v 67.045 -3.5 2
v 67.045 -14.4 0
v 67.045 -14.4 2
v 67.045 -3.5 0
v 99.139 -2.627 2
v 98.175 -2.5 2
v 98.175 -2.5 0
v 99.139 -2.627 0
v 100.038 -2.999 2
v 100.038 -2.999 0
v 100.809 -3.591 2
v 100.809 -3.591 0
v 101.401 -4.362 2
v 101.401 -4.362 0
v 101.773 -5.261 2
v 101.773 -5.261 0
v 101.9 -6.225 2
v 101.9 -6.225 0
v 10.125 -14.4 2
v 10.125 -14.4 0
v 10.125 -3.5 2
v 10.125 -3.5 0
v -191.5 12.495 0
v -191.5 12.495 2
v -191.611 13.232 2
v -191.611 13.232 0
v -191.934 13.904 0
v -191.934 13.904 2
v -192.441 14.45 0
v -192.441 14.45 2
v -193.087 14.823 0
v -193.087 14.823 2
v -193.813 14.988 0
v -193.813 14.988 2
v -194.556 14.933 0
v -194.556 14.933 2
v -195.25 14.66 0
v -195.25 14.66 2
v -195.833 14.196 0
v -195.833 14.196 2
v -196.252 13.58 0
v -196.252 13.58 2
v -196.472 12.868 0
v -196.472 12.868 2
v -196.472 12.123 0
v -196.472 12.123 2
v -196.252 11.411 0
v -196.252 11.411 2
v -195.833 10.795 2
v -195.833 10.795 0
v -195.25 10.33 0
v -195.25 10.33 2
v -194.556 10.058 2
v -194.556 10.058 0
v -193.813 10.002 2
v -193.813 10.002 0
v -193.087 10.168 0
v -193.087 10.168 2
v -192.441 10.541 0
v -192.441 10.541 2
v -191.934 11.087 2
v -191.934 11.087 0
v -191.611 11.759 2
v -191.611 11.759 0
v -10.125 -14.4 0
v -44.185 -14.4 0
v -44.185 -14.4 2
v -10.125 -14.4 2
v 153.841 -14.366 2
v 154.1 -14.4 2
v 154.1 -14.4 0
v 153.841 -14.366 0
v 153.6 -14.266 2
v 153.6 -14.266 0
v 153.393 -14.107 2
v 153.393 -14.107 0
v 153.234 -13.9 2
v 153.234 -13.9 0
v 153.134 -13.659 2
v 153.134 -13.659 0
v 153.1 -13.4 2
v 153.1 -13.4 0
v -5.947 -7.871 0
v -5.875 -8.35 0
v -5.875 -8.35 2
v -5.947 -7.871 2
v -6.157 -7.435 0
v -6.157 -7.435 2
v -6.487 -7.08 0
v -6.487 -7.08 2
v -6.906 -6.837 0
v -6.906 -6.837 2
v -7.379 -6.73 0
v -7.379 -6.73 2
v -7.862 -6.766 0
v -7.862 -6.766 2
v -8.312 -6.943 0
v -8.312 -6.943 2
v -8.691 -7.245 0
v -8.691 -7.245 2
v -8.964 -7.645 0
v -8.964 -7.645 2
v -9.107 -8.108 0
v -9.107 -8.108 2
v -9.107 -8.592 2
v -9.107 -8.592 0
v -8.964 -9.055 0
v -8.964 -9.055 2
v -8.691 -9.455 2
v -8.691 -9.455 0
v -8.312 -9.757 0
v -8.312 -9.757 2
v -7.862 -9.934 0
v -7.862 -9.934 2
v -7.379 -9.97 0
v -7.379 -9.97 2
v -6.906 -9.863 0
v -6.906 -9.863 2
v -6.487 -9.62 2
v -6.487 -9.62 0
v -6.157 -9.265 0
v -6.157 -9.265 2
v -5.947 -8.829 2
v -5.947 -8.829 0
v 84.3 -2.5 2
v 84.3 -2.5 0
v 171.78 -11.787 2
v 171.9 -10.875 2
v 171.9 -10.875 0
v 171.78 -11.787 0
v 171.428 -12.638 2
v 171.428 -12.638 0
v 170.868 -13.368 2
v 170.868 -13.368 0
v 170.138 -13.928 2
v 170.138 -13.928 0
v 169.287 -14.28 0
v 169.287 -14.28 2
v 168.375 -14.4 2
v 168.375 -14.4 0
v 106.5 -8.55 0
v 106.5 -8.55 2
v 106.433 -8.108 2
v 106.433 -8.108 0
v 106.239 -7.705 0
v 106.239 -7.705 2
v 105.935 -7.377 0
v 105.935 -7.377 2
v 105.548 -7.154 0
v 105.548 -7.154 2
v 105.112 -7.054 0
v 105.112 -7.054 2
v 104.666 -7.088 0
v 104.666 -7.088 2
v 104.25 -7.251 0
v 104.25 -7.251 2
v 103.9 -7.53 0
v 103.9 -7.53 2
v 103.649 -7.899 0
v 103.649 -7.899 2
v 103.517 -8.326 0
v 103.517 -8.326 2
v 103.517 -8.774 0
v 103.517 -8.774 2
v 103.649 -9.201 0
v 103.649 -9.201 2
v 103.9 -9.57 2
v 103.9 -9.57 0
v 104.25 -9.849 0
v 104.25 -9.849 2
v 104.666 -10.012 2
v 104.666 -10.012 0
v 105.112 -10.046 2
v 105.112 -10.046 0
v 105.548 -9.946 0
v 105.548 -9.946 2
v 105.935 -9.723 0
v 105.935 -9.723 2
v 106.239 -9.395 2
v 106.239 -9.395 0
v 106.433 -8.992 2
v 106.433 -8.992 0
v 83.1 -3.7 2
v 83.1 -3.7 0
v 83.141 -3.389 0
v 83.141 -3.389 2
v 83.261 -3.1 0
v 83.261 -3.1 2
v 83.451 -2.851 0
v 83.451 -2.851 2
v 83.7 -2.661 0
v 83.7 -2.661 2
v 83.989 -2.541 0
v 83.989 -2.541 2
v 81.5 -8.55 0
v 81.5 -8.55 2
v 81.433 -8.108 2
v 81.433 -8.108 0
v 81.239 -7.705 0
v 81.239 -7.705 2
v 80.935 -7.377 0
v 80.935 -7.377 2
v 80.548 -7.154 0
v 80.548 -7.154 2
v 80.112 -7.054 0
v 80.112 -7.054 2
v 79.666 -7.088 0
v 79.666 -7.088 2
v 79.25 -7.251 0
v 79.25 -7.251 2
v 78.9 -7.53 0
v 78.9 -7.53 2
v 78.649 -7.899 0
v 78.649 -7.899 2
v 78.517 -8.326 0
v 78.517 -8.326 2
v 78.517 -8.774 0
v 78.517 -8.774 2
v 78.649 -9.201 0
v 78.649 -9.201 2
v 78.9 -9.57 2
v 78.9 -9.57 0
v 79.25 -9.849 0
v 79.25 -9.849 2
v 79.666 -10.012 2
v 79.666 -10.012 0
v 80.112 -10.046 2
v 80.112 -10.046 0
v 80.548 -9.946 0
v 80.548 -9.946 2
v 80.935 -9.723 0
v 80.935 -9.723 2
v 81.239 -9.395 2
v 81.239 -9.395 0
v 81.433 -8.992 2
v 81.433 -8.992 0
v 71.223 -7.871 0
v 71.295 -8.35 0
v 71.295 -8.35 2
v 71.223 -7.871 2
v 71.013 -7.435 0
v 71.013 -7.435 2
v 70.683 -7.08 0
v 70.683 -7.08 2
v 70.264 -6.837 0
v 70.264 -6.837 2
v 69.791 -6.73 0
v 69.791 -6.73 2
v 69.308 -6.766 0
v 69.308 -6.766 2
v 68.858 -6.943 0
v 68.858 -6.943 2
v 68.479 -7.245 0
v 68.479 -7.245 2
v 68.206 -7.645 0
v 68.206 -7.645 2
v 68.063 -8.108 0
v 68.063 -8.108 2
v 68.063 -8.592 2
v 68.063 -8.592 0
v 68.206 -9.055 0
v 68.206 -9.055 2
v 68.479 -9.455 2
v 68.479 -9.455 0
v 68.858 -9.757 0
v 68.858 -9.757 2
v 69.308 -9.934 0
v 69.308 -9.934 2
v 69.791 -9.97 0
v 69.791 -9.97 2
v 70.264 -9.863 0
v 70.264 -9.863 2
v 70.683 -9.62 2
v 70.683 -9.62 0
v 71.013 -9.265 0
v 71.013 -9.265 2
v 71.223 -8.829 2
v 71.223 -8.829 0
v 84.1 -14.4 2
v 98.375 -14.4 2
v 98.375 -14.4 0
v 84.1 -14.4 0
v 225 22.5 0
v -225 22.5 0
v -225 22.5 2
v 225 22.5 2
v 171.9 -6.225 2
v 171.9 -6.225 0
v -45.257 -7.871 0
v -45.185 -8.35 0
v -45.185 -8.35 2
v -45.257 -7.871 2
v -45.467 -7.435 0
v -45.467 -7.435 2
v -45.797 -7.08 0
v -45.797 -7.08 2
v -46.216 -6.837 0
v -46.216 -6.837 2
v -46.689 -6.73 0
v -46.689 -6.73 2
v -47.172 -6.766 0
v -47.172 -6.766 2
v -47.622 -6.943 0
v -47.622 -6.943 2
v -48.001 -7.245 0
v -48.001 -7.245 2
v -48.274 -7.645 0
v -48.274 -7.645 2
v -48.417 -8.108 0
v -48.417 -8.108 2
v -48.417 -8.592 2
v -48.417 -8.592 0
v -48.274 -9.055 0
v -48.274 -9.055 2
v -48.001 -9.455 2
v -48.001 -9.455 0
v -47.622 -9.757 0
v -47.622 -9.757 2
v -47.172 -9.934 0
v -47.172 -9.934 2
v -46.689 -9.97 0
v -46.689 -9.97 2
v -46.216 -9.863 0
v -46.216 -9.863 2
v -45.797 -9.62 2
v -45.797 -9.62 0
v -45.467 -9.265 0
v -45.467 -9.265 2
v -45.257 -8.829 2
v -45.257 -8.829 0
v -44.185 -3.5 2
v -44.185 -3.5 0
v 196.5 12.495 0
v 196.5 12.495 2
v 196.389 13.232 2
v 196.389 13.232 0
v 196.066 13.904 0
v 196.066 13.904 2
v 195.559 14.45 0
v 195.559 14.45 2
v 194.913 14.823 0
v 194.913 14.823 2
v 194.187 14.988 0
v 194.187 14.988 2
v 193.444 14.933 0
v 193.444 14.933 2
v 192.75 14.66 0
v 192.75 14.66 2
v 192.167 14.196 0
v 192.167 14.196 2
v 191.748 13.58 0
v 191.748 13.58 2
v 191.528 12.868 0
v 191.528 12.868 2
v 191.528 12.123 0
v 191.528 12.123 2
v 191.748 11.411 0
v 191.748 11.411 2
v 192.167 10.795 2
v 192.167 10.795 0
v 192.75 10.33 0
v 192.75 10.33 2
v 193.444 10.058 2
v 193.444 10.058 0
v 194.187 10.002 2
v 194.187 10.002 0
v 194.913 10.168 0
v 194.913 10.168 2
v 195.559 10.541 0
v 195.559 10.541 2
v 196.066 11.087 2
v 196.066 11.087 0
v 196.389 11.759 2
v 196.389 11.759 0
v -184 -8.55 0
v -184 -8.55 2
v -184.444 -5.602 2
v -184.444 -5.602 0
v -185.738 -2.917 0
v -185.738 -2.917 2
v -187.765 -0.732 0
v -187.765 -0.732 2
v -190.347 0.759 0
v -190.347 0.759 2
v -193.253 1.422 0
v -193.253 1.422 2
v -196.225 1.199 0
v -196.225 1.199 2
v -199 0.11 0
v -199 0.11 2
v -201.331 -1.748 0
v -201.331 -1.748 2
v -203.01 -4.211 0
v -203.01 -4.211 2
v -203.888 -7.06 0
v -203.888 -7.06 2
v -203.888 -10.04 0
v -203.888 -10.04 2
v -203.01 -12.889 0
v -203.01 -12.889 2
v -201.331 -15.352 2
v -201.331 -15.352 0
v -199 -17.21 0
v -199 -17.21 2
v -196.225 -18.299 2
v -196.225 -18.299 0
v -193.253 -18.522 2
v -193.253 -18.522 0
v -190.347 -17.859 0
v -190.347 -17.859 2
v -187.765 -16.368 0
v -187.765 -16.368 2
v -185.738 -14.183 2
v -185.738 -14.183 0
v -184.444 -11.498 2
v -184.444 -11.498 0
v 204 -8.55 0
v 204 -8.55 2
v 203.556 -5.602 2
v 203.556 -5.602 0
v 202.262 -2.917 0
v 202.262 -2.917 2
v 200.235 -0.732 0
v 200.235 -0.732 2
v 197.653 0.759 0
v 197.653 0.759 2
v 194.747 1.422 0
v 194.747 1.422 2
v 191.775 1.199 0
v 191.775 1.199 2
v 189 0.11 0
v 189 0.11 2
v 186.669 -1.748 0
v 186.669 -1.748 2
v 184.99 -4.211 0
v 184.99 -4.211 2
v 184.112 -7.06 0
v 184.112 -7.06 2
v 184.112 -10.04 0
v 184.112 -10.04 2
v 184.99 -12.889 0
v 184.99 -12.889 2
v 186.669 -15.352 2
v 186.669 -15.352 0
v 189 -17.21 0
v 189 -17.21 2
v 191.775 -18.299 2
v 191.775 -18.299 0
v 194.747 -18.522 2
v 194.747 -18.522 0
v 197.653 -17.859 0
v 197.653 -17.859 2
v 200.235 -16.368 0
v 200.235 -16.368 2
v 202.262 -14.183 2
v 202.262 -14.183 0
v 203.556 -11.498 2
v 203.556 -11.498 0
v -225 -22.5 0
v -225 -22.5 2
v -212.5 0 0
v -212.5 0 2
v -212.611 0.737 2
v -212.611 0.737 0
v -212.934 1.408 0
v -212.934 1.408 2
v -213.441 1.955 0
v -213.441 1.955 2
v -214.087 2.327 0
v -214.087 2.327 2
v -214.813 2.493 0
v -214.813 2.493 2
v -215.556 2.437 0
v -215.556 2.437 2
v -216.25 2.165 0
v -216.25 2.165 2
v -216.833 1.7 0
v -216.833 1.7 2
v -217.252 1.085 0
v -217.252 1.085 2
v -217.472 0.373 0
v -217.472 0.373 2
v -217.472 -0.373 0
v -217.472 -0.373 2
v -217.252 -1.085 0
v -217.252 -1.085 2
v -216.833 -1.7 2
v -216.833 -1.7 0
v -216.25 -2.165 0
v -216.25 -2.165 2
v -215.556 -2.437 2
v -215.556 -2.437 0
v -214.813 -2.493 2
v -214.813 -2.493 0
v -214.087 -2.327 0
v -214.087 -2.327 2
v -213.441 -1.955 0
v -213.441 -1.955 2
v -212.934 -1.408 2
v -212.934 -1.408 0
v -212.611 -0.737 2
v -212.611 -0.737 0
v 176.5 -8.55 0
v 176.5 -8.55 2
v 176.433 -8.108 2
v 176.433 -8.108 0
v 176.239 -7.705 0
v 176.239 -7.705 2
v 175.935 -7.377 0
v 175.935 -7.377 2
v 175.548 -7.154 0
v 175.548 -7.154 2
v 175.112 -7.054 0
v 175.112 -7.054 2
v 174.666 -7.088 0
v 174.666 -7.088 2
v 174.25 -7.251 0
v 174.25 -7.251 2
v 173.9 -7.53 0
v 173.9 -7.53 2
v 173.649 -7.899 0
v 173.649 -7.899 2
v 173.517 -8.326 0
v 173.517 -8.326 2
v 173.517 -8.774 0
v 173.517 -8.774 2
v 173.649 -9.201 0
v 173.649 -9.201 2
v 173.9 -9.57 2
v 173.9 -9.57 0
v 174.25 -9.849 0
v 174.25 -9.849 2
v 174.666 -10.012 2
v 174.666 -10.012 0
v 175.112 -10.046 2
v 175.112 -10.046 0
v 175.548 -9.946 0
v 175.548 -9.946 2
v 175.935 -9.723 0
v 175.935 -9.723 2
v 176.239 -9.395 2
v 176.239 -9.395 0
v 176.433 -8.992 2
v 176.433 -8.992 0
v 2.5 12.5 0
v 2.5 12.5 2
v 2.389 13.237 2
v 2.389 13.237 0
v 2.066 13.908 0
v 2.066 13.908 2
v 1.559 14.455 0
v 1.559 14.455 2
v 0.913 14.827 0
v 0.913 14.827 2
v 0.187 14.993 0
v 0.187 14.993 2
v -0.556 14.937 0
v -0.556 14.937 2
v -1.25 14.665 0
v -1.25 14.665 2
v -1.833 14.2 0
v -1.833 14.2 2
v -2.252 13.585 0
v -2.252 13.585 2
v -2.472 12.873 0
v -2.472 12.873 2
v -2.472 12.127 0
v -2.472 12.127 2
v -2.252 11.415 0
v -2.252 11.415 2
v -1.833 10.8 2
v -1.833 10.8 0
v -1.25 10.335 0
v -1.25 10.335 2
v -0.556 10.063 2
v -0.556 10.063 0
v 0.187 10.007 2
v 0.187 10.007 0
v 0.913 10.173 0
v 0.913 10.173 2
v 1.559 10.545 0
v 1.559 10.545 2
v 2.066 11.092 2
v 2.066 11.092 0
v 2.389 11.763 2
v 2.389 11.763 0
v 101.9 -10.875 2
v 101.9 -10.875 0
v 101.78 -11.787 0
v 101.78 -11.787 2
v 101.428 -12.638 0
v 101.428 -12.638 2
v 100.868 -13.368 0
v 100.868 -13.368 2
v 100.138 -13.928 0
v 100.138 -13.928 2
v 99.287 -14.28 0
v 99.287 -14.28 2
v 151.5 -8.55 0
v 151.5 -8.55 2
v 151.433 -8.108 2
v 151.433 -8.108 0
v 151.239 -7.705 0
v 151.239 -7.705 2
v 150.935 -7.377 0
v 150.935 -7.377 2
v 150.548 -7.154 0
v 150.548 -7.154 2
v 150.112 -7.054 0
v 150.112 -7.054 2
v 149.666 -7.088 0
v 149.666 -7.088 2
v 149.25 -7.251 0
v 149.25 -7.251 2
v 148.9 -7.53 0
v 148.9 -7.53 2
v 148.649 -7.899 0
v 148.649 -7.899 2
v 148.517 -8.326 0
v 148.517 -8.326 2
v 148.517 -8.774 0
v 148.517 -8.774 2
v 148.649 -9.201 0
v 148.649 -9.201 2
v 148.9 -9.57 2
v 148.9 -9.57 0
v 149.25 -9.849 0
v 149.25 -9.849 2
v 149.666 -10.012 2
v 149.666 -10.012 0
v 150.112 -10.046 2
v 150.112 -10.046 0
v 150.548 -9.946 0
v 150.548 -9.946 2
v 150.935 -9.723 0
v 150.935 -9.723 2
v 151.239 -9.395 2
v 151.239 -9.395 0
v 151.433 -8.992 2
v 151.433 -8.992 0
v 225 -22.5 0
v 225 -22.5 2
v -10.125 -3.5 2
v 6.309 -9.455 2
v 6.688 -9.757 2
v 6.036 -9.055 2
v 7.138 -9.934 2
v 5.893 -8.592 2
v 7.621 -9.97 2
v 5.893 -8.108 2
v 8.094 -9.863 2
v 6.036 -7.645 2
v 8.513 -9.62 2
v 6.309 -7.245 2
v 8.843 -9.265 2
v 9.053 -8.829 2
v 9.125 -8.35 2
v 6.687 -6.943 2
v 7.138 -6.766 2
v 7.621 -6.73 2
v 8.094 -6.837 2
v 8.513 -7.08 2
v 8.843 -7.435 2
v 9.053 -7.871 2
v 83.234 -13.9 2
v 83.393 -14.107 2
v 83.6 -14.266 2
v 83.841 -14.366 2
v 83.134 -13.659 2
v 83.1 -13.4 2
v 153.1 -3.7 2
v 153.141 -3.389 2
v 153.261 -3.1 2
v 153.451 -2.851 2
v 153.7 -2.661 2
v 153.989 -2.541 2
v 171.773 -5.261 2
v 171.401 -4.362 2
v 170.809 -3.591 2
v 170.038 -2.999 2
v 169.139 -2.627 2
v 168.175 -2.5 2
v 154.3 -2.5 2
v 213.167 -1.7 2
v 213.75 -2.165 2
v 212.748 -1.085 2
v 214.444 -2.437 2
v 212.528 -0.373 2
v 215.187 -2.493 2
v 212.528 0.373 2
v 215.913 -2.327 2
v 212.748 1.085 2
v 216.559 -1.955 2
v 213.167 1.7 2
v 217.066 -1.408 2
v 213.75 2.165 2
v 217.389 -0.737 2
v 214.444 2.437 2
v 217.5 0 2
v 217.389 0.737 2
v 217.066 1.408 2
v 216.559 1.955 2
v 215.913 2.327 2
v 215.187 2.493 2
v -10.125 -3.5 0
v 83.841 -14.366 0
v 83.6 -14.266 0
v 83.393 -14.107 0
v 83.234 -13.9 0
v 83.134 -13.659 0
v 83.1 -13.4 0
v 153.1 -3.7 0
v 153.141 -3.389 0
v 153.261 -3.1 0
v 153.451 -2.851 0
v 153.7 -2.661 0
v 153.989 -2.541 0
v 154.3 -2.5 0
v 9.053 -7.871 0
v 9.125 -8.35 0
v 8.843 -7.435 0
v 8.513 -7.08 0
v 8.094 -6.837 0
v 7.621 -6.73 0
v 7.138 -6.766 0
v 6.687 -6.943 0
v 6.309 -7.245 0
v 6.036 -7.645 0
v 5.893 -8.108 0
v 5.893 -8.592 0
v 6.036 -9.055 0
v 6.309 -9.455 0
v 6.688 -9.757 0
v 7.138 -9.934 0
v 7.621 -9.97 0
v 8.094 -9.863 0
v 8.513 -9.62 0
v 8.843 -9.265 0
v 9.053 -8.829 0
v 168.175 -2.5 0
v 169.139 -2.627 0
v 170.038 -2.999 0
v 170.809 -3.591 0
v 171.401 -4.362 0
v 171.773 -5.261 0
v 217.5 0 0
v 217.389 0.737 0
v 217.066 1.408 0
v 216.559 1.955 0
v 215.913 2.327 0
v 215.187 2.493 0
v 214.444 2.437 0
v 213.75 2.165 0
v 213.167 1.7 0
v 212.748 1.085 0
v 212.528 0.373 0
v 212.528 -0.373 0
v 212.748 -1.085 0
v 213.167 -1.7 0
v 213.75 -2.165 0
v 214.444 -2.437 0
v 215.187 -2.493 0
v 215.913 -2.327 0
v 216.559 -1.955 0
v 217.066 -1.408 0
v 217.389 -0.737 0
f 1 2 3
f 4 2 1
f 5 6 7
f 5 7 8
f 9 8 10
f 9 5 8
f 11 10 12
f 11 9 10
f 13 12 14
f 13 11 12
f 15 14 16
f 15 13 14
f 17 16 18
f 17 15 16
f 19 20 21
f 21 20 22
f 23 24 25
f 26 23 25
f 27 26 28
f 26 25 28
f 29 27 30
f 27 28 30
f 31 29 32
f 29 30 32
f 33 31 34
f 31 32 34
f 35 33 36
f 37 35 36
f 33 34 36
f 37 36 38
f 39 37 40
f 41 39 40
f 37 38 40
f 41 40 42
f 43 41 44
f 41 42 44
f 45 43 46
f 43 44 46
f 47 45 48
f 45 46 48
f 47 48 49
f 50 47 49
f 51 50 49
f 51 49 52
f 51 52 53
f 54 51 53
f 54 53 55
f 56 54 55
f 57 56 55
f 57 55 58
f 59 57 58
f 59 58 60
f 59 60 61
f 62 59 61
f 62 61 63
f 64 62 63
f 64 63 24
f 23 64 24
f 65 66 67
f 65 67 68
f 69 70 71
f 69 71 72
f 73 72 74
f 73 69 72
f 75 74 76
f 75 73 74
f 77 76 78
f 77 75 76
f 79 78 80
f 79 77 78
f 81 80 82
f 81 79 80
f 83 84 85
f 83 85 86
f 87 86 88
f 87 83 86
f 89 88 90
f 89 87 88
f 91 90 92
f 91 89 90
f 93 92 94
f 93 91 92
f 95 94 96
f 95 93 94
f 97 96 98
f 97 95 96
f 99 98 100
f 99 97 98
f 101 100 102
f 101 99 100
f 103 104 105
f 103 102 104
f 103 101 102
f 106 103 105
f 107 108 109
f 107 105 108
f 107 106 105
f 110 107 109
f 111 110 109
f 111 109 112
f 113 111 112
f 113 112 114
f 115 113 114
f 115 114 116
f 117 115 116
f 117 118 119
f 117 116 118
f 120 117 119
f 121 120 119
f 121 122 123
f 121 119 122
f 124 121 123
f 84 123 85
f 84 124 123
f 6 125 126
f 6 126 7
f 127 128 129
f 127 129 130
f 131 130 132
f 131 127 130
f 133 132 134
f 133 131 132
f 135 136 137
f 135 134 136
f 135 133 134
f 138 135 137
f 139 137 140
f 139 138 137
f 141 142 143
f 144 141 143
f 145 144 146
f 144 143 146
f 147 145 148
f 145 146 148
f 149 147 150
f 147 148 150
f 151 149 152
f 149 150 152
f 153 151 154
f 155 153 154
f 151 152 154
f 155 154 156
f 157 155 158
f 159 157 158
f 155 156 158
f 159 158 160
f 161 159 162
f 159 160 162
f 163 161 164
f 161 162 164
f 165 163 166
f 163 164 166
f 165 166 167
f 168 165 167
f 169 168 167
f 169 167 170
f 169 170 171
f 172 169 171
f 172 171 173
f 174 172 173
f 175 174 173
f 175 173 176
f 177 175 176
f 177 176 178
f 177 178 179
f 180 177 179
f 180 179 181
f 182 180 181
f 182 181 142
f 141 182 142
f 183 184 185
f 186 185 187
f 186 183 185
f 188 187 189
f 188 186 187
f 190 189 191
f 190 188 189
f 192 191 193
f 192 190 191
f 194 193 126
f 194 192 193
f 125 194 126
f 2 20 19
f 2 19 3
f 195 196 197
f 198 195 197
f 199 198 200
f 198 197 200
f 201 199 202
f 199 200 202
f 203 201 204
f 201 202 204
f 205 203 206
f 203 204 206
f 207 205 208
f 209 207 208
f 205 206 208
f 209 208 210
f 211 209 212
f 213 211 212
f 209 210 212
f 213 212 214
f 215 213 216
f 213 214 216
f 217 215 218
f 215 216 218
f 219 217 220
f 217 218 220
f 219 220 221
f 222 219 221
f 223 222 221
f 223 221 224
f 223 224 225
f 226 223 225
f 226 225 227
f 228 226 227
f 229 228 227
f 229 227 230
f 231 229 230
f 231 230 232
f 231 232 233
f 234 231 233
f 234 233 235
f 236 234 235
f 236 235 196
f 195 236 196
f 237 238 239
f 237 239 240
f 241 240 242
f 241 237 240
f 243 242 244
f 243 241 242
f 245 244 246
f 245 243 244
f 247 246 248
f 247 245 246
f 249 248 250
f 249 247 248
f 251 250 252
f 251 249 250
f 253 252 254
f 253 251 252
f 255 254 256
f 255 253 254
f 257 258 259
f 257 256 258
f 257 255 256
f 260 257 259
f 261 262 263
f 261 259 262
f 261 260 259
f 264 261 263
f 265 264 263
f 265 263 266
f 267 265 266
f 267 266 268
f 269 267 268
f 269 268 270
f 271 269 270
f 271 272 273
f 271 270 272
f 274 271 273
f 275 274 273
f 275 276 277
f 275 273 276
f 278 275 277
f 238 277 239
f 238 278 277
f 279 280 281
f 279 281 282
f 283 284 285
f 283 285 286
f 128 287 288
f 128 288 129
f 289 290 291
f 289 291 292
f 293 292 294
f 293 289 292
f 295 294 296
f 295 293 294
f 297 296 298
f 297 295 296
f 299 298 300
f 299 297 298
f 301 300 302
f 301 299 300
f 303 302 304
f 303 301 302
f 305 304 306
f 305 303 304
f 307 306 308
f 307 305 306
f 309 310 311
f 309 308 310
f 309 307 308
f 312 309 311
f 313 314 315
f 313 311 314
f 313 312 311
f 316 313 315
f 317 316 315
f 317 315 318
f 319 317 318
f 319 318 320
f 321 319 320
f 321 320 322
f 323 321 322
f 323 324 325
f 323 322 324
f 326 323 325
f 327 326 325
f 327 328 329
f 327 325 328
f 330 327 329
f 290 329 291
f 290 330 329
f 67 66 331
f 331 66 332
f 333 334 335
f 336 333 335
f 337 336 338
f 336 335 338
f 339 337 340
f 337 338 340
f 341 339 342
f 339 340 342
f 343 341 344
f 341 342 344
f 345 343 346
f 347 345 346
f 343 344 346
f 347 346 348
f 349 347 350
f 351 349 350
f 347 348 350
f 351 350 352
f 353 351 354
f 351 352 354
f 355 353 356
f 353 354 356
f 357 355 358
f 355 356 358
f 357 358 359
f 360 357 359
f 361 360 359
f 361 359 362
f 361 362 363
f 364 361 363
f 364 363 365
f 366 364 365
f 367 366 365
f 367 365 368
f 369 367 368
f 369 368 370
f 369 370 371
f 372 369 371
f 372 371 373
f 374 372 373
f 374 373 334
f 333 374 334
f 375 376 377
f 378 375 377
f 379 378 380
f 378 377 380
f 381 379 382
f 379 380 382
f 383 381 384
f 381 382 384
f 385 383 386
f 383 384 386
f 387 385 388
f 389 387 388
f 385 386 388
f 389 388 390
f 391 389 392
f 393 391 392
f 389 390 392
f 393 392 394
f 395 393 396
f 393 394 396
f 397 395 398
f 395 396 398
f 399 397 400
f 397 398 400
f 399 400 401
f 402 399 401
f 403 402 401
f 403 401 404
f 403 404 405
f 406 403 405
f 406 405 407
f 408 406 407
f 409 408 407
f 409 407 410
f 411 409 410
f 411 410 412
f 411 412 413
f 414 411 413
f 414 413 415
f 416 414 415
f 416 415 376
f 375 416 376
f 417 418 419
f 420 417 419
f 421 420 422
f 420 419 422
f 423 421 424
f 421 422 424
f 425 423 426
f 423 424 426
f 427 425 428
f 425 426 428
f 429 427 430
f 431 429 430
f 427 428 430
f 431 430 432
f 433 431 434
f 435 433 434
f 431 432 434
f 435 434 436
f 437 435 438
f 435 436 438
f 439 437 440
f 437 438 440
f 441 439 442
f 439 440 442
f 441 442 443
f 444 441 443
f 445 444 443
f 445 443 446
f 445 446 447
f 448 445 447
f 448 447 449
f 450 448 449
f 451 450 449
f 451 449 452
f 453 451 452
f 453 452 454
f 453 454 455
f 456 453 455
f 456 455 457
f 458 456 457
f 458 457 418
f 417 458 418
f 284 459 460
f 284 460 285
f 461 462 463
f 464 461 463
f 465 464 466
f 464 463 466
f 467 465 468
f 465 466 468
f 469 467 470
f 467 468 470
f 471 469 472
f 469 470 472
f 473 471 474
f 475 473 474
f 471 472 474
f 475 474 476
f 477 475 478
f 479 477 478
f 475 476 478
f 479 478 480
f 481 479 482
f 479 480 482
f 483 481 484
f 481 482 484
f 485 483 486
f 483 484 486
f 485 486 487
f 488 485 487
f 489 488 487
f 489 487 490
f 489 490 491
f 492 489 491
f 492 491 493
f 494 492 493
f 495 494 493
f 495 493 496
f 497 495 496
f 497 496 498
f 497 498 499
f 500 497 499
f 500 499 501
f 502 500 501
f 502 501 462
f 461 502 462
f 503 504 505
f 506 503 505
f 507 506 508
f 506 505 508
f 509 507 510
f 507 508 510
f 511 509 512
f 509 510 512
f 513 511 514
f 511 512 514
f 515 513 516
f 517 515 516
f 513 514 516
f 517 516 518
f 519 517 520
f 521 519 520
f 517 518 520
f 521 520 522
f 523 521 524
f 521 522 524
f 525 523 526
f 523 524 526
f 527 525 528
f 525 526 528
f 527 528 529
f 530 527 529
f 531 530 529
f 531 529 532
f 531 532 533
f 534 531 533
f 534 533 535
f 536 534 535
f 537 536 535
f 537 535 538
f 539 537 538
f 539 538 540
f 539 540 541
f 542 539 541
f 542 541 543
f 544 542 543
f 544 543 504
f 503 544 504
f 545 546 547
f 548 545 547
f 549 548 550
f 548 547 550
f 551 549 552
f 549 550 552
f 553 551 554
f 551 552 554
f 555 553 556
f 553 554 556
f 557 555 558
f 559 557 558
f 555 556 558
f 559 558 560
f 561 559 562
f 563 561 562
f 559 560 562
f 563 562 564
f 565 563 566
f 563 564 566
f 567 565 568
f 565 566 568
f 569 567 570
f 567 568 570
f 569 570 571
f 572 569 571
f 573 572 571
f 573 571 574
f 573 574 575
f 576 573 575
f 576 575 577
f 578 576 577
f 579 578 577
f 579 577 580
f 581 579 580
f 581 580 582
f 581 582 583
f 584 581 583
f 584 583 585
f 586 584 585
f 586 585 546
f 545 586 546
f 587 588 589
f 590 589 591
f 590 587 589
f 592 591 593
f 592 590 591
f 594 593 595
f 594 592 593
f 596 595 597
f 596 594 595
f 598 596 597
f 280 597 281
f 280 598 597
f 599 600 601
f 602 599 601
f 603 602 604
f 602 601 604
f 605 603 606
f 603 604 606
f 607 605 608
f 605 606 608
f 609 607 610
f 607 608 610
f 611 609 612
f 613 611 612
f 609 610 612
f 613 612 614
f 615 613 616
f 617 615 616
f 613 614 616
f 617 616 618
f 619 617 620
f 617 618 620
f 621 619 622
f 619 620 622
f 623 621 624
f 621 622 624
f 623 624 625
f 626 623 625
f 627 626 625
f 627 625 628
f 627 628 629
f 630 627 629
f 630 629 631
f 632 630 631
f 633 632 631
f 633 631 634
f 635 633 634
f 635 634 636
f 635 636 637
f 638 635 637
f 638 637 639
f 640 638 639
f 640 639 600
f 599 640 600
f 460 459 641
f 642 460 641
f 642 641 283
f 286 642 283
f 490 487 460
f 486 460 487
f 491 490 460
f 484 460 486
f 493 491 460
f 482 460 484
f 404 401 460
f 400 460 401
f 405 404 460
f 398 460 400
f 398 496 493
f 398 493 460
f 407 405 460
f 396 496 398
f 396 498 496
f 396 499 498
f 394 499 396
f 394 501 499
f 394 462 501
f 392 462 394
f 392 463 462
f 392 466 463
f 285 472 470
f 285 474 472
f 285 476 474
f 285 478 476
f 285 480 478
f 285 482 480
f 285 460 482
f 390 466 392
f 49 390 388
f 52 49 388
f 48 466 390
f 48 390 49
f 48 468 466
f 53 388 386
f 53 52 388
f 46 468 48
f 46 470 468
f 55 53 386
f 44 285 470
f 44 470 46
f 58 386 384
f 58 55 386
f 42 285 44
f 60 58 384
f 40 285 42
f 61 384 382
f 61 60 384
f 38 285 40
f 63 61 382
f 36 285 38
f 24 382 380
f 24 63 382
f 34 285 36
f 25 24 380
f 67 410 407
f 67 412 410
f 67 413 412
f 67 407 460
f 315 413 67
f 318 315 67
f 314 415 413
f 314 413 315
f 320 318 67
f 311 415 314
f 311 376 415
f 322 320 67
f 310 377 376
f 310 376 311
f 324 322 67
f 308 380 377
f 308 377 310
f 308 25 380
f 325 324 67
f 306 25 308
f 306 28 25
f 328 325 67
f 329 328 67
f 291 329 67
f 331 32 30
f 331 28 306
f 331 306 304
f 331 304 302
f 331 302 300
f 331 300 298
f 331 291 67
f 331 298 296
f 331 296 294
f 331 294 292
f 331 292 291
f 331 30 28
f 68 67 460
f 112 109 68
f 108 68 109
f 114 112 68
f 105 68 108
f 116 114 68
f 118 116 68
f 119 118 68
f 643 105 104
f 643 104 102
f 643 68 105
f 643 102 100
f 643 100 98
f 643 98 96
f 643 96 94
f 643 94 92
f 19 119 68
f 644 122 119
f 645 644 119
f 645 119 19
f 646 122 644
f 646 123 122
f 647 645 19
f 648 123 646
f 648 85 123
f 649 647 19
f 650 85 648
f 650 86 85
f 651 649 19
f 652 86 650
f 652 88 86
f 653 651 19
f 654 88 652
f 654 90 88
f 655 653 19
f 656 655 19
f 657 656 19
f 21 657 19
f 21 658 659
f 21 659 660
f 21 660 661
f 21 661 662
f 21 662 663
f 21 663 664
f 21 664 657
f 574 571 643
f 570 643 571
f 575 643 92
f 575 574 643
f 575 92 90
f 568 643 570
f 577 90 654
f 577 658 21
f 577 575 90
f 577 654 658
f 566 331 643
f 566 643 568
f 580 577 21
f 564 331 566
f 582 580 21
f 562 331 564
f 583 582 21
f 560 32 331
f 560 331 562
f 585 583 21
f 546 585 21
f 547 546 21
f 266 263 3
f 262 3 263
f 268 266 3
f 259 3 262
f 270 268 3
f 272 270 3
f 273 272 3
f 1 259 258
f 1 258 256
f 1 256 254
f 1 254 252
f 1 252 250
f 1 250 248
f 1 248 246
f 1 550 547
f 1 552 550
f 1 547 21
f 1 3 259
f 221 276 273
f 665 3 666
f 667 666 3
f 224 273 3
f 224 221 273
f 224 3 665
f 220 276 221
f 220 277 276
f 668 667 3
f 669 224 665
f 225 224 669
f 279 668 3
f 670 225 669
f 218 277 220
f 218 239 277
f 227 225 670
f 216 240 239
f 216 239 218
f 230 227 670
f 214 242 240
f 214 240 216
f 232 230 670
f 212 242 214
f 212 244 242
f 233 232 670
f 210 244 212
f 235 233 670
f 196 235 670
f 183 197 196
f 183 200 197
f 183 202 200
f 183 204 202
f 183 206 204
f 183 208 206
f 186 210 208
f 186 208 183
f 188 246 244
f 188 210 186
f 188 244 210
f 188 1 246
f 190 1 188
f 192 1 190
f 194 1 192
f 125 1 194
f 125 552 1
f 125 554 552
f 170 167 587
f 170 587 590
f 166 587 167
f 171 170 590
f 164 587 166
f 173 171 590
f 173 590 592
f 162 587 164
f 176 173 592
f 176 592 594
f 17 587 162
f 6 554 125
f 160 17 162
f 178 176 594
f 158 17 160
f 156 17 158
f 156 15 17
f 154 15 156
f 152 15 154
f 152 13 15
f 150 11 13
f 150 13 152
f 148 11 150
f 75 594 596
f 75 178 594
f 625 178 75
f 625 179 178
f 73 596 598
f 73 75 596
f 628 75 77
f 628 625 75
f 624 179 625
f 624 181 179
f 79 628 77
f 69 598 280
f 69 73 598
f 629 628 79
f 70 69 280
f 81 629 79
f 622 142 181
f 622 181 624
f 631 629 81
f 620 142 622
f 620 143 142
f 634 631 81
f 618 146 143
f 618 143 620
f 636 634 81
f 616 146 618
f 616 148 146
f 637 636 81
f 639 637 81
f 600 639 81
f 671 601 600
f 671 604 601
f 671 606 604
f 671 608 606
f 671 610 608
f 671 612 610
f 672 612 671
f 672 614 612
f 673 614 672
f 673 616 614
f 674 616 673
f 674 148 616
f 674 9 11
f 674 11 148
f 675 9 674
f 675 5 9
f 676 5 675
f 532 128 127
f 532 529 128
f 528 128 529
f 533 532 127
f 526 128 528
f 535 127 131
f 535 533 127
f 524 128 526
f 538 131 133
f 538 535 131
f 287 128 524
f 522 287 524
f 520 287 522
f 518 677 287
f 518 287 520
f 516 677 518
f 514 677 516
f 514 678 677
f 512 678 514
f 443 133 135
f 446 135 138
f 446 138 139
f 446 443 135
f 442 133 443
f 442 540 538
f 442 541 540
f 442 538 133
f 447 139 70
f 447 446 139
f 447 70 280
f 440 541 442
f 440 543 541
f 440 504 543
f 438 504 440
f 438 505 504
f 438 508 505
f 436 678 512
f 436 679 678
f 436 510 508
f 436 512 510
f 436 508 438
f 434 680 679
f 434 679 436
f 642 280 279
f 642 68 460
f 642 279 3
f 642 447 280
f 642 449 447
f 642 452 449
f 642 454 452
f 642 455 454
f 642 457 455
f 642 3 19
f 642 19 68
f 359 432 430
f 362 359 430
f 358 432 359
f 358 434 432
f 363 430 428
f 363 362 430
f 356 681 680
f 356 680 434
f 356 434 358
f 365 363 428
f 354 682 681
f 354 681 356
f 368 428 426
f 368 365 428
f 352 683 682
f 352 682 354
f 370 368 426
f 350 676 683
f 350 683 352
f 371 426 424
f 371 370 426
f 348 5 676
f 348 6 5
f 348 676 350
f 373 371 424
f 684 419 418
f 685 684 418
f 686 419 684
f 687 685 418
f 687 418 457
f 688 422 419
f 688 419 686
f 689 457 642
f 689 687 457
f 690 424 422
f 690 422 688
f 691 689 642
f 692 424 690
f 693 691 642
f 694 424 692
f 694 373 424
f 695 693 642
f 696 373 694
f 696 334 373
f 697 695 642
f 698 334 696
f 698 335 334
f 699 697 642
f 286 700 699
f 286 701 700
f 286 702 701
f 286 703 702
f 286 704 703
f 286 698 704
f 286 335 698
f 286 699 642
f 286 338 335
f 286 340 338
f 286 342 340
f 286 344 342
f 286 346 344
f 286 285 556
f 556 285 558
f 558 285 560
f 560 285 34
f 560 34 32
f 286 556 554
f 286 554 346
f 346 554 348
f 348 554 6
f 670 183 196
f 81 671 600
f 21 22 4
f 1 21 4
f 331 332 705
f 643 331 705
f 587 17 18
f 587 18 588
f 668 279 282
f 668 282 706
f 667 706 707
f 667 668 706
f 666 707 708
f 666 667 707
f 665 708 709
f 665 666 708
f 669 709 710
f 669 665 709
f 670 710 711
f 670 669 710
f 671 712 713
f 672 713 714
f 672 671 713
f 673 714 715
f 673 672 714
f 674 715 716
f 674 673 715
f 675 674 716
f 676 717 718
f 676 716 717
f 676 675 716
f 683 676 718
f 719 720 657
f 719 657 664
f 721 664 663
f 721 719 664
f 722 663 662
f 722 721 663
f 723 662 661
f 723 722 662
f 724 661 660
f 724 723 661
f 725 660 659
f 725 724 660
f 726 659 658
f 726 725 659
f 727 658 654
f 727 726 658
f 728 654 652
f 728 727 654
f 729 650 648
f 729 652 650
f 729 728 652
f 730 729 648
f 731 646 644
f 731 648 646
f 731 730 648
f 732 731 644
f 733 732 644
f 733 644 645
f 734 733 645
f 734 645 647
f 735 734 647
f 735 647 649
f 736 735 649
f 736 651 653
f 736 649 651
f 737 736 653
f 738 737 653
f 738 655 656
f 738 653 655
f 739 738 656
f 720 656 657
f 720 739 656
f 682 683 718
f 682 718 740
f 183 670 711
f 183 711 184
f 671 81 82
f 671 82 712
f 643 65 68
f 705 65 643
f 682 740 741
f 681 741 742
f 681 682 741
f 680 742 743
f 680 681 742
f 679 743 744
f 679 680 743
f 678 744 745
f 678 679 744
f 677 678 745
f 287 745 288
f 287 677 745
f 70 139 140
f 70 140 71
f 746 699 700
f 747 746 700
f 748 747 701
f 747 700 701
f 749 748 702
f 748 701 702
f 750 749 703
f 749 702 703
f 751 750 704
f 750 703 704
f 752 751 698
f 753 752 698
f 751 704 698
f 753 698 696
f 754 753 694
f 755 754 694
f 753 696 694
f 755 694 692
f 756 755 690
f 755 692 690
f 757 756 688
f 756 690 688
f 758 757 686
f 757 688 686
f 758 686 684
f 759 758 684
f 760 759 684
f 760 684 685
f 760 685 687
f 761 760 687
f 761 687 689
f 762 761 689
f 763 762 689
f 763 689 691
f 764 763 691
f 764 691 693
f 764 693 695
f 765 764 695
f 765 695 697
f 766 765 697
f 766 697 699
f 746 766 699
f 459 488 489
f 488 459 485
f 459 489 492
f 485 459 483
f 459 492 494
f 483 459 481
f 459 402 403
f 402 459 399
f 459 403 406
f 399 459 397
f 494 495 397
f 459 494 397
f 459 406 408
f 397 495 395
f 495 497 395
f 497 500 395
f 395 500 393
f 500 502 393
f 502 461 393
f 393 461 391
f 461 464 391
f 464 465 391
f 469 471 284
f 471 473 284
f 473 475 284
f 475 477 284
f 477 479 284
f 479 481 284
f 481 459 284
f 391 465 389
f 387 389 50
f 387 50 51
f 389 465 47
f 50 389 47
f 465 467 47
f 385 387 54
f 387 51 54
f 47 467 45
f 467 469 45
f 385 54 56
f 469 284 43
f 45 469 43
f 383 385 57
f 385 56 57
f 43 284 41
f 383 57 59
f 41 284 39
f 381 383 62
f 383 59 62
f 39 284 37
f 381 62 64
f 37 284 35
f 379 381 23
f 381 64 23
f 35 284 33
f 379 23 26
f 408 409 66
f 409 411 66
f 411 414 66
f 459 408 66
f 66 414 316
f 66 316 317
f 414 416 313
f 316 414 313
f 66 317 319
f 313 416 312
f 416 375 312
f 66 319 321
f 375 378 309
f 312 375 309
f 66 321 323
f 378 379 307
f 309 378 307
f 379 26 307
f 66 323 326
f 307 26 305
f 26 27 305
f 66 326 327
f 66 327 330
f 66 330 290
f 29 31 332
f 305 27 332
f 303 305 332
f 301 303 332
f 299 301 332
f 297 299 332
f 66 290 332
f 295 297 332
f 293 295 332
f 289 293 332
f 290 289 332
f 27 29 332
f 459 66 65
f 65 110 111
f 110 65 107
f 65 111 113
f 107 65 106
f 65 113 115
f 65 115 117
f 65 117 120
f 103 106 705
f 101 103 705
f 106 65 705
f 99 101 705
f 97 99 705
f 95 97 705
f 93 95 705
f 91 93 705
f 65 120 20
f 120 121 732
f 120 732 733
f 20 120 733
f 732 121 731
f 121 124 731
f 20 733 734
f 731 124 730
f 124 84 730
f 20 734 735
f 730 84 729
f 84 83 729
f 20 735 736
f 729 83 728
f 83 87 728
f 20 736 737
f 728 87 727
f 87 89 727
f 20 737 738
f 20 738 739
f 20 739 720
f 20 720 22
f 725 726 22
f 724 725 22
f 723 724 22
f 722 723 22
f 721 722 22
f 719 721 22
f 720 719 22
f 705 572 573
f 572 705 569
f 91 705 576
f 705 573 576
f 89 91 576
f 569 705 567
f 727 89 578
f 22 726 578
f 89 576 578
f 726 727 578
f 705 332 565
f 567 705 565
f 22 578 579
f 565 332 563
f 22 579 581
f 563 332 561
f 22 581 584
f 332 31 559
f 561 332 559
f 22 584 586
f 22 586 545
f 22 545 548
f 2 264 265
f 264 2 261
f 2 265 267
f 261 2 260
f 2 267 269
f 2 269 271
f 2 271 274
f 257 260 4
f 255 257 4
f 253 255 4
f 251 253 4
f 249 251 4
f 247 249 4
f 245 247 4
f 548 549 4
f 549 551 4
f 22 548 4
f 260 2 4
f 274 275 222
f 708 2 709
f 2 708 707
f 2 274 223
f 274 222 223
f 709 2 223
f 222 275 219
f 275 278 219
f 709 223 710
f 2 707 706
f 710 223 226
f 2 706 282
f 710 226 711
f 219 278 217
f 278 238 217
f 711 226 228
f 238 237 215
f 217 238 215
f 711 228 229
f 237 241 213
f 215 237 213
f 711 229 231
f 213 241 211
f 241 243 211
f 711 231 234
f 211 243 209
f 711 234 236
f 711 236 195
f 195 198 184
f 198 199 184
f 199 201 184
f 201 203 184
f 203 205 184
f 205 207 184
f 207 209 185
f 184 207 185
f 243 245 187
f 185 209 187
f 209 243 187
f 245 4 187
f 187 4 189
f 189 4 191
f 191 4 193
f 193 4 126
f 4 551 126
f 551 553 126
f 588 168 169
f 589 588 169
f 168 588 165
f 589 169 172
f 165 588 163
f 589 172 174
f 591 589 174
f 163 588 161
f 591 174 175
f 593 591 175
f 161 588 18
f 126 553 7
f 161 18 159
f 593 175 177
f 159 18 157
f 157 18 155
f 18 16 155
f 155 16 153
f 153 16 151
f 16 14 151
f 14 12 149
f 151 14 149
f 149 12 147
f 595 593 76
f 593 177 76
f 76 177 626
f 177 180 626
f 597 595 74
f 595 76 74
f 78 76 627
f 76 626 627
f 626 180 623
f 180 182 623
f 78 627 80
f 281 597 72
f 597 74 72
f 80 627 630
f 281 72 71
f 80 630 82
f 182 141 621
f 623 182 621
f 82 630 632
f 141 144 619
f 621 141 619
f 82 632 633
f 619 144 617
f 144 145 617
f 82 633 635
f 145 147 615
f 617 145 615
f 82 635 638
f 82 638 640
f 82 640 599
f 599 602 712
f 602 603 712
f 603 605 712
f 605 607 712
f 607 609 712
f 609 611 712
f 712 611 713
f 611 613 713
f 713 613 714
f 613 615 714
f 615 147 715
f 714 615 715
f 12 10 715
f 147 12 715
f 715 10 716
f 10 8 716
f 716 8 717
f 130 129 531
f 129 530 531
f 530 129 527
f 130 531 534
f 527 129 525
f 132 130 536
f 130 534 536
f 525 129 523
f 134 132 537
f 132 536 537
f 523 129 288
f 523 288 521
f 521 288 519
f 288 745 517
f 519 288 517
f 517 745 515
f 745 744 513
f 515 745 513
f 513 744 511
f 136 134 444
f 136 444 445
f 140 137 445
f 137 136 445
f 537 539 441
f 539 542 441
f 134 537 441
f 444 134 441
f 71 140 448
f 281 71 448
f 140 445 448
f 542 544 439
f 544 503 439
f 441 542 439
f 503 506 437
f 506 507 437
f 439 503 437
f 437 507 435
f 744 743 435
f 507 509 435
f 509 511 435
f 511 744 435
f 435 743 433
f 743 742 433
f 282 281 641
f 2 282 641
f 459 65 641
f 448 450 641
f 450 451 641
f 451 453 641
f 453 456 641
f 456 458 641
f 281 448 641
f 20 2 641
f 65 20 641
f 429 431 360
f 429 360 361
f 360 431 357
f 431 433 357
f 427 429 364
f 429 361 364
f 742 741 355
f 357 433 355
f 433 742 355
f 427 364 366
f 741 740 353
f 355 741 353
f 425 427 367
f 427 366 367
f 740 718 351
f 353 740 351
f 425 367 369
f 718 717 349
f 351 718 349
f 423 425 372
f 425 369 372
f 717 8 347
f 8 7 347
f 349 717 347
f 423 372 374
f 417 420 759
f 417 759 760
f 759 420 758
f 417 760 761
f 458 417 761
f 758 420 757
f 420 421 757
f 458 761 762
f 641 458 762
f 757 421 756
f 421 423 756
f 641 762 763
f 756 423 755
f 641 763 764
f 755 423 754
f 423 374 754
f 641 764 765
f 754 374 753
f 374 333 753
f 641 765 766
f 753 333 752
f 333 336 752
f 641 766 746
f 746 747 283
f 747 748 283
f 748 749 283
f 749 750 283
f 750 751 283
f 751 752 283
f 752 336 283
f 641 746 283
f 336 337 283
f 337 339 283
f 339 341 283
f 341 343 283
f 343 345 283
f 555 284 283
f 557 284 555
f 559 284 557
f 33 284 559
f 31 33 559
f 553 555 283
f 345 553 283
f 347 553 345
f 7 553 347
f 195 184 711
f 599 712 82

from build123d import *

# Parameters (mm, degrees)
SKETCH1_W                      = 450
SKETCH1_H                      = 45
BOSS_EXTRUDE1_DEPTH            = 2
TERMINAL_12P_CUTOUT_DEPTH      = 227.131046077
TERMINAL_12P_CUTOUT_DEPTH_BACK = 227.131046077
SK_TERMINAL_12P_CUTOUT_R       = 1.625
SK_TERMINAL_12P_CUTOUT_W       = 56.92
SK_TERMINAL_12P_CUTOUT_H       = 10.9
SK_TERMINAL_12P_CUTOUT_W_2     = 34.06
SKETCH2_R                      = 2.5
CUT_EXTRUDE1_DEPTH             = 227.131046077
SKETCH3_R                      = 1.5
SKETCH3_R_2                    = 10
CUT_EXTRUDE2_DEPTH             = 10


with BuildPart() as part:
    # Sketch1 → Boss-Extrude1 (new body)
    with BuildSketch(Plane.XY):
        Rectangle(SKETCH1_W, SKETCH1_H)
    extrude(amount=BOSS_EXTRUDE1_DEPTH)

    # SK Terminal 12P cutout → Terminal 12P cutout (cut, two sides: drawn at the far end of the back side and taken through both)
    with BuildSketch(Plane.XY.offset(-TERMINAL_12P_CUTOUT_DEPTH_BACK)):
        with Locations((7.5, -8.35)):
            Circle(SK_TERMINAL_12P_CUTOUT_R)
        with Locations((69.67, -8.35)):
            Circle(SK_TERMINAL_12P_CUTOUT_R)
        with Locations((-46.81, -8.35)):
            Circle(SK_TERMINAL_12P_CUTOUT_R)
        with Locations((-7.5, -8.35)):
            Circle(SK_TERMINAL_12P_CUTOUT_R)
        with Locations((38.585, -8.95)):
            Rectangle(SK_TERMINAL_12P_CUTOUT_W, SK_TERMINAL_12P_CUTOUT_H)
        with Locations((-27.155, -8.95)):
            Rectangle(SK_TERMINAL_12P_CUTOUT_W_2, SK_TERMINAL_12P_CUTOUT_H)
    extrude(amount=TERMINAL_12P_CUTOUT_DEPTH + TERMINAL_12P_CUTOUT_DEPTH_BACK, mode=Mode.SUBTRACT)

    # Sketch2 → Cut-Extrude1 (cut, through all)
    with BuildSketch(Plane.XY.offset(2)):
        with Locations((-215, 0)):
            Circle(SKETCH2_R)
        with Locations((215, 0)):
            Circle(SKETCH2_R)
        with Locations((-194, 12.495407459)):
            Circle(SKETCH2_R)
        with Locations((194, 12.495407459)):
            Circle(SKETCH2_R)
        with Locations((0, 12.5)):
            Circle(SKETCH2_R)
    extrude(amount=-CUT_EXTRUDE1_DEPTH, mode=Mode.SUBTRACT)

    # Sketch3 → Cut-Extrude2 (cut)
    with BuildSketch(Plane.XY.offset(2)):
        with Locations((150, -8.55)):
            Circle(SKETCH3_R)
        with Locations((175, -8.55)):
            Circle(SKETCH3_R)
        with Locations((80, -8.55)):
            Circle(SKETCH3_R)
        with Locations((105, -8.55)):
            Circle(SKETCH3_R)
        with Locations((194, -8.55)):
            Circle(SKETCH3_R_2)
        with Locations((-194, -8.55)):
            Circle(SKETCH3_R_2)
        with BuildLine():
            Line((168.375, -14.4), (154.1, -14.4))
            ThreePointArc((154.1, -14.4), (153.392893219, -14.107106781), (153.1, -13.4))
            Line((153.1, -13.4), (153.1, -3.7))
            ThreePointArc((153.1, -3.7), (153.451471863, -2.851471863), (154.3, -2.5))
            Line((154.3, -2.5), (168.175, -2.5))
            ThreePointArc((168.175, -2.5), (170.80897276, -3.59102724), (171.9, -6.225))
            Line((171.9, -6.225), (171.9, -10.875))
            ThreePointArc((171.9, -10.875), (170.867551404, -13.367551404), (168.375, -14.4))
        make_face()
        with BuildLine():
            Line((98.375, -14.4), (84.1, -14.4))
            ThreePointArc((84.1, -14.4), (83.392893219, -14.107106781), (83.1, -13.4))
            Line((83.1, -13.4), (83.1, -3.7))
            ThreePointArc((83.1, -3.7), (83.451471863, -2.851471863), (84.3, -2.5))
            Line((84.3, -2.5), (98.175, -2.5))
            ThreePointArc((98.175, -2.5), (100.80897276, -3.59102724), (101.9, -6.225))
            Line((101.9, -6.225), (101.9, -10.875))
            ThreePointArc((101.9, -10.875), (100.867551404, -13.367551404), (98.375, -14.4))
        make_face()
    extrude(amount=-CUT_EXTRUDE2_DEPTH, mode=Mode.SUBTRACT)


solid = part.part
